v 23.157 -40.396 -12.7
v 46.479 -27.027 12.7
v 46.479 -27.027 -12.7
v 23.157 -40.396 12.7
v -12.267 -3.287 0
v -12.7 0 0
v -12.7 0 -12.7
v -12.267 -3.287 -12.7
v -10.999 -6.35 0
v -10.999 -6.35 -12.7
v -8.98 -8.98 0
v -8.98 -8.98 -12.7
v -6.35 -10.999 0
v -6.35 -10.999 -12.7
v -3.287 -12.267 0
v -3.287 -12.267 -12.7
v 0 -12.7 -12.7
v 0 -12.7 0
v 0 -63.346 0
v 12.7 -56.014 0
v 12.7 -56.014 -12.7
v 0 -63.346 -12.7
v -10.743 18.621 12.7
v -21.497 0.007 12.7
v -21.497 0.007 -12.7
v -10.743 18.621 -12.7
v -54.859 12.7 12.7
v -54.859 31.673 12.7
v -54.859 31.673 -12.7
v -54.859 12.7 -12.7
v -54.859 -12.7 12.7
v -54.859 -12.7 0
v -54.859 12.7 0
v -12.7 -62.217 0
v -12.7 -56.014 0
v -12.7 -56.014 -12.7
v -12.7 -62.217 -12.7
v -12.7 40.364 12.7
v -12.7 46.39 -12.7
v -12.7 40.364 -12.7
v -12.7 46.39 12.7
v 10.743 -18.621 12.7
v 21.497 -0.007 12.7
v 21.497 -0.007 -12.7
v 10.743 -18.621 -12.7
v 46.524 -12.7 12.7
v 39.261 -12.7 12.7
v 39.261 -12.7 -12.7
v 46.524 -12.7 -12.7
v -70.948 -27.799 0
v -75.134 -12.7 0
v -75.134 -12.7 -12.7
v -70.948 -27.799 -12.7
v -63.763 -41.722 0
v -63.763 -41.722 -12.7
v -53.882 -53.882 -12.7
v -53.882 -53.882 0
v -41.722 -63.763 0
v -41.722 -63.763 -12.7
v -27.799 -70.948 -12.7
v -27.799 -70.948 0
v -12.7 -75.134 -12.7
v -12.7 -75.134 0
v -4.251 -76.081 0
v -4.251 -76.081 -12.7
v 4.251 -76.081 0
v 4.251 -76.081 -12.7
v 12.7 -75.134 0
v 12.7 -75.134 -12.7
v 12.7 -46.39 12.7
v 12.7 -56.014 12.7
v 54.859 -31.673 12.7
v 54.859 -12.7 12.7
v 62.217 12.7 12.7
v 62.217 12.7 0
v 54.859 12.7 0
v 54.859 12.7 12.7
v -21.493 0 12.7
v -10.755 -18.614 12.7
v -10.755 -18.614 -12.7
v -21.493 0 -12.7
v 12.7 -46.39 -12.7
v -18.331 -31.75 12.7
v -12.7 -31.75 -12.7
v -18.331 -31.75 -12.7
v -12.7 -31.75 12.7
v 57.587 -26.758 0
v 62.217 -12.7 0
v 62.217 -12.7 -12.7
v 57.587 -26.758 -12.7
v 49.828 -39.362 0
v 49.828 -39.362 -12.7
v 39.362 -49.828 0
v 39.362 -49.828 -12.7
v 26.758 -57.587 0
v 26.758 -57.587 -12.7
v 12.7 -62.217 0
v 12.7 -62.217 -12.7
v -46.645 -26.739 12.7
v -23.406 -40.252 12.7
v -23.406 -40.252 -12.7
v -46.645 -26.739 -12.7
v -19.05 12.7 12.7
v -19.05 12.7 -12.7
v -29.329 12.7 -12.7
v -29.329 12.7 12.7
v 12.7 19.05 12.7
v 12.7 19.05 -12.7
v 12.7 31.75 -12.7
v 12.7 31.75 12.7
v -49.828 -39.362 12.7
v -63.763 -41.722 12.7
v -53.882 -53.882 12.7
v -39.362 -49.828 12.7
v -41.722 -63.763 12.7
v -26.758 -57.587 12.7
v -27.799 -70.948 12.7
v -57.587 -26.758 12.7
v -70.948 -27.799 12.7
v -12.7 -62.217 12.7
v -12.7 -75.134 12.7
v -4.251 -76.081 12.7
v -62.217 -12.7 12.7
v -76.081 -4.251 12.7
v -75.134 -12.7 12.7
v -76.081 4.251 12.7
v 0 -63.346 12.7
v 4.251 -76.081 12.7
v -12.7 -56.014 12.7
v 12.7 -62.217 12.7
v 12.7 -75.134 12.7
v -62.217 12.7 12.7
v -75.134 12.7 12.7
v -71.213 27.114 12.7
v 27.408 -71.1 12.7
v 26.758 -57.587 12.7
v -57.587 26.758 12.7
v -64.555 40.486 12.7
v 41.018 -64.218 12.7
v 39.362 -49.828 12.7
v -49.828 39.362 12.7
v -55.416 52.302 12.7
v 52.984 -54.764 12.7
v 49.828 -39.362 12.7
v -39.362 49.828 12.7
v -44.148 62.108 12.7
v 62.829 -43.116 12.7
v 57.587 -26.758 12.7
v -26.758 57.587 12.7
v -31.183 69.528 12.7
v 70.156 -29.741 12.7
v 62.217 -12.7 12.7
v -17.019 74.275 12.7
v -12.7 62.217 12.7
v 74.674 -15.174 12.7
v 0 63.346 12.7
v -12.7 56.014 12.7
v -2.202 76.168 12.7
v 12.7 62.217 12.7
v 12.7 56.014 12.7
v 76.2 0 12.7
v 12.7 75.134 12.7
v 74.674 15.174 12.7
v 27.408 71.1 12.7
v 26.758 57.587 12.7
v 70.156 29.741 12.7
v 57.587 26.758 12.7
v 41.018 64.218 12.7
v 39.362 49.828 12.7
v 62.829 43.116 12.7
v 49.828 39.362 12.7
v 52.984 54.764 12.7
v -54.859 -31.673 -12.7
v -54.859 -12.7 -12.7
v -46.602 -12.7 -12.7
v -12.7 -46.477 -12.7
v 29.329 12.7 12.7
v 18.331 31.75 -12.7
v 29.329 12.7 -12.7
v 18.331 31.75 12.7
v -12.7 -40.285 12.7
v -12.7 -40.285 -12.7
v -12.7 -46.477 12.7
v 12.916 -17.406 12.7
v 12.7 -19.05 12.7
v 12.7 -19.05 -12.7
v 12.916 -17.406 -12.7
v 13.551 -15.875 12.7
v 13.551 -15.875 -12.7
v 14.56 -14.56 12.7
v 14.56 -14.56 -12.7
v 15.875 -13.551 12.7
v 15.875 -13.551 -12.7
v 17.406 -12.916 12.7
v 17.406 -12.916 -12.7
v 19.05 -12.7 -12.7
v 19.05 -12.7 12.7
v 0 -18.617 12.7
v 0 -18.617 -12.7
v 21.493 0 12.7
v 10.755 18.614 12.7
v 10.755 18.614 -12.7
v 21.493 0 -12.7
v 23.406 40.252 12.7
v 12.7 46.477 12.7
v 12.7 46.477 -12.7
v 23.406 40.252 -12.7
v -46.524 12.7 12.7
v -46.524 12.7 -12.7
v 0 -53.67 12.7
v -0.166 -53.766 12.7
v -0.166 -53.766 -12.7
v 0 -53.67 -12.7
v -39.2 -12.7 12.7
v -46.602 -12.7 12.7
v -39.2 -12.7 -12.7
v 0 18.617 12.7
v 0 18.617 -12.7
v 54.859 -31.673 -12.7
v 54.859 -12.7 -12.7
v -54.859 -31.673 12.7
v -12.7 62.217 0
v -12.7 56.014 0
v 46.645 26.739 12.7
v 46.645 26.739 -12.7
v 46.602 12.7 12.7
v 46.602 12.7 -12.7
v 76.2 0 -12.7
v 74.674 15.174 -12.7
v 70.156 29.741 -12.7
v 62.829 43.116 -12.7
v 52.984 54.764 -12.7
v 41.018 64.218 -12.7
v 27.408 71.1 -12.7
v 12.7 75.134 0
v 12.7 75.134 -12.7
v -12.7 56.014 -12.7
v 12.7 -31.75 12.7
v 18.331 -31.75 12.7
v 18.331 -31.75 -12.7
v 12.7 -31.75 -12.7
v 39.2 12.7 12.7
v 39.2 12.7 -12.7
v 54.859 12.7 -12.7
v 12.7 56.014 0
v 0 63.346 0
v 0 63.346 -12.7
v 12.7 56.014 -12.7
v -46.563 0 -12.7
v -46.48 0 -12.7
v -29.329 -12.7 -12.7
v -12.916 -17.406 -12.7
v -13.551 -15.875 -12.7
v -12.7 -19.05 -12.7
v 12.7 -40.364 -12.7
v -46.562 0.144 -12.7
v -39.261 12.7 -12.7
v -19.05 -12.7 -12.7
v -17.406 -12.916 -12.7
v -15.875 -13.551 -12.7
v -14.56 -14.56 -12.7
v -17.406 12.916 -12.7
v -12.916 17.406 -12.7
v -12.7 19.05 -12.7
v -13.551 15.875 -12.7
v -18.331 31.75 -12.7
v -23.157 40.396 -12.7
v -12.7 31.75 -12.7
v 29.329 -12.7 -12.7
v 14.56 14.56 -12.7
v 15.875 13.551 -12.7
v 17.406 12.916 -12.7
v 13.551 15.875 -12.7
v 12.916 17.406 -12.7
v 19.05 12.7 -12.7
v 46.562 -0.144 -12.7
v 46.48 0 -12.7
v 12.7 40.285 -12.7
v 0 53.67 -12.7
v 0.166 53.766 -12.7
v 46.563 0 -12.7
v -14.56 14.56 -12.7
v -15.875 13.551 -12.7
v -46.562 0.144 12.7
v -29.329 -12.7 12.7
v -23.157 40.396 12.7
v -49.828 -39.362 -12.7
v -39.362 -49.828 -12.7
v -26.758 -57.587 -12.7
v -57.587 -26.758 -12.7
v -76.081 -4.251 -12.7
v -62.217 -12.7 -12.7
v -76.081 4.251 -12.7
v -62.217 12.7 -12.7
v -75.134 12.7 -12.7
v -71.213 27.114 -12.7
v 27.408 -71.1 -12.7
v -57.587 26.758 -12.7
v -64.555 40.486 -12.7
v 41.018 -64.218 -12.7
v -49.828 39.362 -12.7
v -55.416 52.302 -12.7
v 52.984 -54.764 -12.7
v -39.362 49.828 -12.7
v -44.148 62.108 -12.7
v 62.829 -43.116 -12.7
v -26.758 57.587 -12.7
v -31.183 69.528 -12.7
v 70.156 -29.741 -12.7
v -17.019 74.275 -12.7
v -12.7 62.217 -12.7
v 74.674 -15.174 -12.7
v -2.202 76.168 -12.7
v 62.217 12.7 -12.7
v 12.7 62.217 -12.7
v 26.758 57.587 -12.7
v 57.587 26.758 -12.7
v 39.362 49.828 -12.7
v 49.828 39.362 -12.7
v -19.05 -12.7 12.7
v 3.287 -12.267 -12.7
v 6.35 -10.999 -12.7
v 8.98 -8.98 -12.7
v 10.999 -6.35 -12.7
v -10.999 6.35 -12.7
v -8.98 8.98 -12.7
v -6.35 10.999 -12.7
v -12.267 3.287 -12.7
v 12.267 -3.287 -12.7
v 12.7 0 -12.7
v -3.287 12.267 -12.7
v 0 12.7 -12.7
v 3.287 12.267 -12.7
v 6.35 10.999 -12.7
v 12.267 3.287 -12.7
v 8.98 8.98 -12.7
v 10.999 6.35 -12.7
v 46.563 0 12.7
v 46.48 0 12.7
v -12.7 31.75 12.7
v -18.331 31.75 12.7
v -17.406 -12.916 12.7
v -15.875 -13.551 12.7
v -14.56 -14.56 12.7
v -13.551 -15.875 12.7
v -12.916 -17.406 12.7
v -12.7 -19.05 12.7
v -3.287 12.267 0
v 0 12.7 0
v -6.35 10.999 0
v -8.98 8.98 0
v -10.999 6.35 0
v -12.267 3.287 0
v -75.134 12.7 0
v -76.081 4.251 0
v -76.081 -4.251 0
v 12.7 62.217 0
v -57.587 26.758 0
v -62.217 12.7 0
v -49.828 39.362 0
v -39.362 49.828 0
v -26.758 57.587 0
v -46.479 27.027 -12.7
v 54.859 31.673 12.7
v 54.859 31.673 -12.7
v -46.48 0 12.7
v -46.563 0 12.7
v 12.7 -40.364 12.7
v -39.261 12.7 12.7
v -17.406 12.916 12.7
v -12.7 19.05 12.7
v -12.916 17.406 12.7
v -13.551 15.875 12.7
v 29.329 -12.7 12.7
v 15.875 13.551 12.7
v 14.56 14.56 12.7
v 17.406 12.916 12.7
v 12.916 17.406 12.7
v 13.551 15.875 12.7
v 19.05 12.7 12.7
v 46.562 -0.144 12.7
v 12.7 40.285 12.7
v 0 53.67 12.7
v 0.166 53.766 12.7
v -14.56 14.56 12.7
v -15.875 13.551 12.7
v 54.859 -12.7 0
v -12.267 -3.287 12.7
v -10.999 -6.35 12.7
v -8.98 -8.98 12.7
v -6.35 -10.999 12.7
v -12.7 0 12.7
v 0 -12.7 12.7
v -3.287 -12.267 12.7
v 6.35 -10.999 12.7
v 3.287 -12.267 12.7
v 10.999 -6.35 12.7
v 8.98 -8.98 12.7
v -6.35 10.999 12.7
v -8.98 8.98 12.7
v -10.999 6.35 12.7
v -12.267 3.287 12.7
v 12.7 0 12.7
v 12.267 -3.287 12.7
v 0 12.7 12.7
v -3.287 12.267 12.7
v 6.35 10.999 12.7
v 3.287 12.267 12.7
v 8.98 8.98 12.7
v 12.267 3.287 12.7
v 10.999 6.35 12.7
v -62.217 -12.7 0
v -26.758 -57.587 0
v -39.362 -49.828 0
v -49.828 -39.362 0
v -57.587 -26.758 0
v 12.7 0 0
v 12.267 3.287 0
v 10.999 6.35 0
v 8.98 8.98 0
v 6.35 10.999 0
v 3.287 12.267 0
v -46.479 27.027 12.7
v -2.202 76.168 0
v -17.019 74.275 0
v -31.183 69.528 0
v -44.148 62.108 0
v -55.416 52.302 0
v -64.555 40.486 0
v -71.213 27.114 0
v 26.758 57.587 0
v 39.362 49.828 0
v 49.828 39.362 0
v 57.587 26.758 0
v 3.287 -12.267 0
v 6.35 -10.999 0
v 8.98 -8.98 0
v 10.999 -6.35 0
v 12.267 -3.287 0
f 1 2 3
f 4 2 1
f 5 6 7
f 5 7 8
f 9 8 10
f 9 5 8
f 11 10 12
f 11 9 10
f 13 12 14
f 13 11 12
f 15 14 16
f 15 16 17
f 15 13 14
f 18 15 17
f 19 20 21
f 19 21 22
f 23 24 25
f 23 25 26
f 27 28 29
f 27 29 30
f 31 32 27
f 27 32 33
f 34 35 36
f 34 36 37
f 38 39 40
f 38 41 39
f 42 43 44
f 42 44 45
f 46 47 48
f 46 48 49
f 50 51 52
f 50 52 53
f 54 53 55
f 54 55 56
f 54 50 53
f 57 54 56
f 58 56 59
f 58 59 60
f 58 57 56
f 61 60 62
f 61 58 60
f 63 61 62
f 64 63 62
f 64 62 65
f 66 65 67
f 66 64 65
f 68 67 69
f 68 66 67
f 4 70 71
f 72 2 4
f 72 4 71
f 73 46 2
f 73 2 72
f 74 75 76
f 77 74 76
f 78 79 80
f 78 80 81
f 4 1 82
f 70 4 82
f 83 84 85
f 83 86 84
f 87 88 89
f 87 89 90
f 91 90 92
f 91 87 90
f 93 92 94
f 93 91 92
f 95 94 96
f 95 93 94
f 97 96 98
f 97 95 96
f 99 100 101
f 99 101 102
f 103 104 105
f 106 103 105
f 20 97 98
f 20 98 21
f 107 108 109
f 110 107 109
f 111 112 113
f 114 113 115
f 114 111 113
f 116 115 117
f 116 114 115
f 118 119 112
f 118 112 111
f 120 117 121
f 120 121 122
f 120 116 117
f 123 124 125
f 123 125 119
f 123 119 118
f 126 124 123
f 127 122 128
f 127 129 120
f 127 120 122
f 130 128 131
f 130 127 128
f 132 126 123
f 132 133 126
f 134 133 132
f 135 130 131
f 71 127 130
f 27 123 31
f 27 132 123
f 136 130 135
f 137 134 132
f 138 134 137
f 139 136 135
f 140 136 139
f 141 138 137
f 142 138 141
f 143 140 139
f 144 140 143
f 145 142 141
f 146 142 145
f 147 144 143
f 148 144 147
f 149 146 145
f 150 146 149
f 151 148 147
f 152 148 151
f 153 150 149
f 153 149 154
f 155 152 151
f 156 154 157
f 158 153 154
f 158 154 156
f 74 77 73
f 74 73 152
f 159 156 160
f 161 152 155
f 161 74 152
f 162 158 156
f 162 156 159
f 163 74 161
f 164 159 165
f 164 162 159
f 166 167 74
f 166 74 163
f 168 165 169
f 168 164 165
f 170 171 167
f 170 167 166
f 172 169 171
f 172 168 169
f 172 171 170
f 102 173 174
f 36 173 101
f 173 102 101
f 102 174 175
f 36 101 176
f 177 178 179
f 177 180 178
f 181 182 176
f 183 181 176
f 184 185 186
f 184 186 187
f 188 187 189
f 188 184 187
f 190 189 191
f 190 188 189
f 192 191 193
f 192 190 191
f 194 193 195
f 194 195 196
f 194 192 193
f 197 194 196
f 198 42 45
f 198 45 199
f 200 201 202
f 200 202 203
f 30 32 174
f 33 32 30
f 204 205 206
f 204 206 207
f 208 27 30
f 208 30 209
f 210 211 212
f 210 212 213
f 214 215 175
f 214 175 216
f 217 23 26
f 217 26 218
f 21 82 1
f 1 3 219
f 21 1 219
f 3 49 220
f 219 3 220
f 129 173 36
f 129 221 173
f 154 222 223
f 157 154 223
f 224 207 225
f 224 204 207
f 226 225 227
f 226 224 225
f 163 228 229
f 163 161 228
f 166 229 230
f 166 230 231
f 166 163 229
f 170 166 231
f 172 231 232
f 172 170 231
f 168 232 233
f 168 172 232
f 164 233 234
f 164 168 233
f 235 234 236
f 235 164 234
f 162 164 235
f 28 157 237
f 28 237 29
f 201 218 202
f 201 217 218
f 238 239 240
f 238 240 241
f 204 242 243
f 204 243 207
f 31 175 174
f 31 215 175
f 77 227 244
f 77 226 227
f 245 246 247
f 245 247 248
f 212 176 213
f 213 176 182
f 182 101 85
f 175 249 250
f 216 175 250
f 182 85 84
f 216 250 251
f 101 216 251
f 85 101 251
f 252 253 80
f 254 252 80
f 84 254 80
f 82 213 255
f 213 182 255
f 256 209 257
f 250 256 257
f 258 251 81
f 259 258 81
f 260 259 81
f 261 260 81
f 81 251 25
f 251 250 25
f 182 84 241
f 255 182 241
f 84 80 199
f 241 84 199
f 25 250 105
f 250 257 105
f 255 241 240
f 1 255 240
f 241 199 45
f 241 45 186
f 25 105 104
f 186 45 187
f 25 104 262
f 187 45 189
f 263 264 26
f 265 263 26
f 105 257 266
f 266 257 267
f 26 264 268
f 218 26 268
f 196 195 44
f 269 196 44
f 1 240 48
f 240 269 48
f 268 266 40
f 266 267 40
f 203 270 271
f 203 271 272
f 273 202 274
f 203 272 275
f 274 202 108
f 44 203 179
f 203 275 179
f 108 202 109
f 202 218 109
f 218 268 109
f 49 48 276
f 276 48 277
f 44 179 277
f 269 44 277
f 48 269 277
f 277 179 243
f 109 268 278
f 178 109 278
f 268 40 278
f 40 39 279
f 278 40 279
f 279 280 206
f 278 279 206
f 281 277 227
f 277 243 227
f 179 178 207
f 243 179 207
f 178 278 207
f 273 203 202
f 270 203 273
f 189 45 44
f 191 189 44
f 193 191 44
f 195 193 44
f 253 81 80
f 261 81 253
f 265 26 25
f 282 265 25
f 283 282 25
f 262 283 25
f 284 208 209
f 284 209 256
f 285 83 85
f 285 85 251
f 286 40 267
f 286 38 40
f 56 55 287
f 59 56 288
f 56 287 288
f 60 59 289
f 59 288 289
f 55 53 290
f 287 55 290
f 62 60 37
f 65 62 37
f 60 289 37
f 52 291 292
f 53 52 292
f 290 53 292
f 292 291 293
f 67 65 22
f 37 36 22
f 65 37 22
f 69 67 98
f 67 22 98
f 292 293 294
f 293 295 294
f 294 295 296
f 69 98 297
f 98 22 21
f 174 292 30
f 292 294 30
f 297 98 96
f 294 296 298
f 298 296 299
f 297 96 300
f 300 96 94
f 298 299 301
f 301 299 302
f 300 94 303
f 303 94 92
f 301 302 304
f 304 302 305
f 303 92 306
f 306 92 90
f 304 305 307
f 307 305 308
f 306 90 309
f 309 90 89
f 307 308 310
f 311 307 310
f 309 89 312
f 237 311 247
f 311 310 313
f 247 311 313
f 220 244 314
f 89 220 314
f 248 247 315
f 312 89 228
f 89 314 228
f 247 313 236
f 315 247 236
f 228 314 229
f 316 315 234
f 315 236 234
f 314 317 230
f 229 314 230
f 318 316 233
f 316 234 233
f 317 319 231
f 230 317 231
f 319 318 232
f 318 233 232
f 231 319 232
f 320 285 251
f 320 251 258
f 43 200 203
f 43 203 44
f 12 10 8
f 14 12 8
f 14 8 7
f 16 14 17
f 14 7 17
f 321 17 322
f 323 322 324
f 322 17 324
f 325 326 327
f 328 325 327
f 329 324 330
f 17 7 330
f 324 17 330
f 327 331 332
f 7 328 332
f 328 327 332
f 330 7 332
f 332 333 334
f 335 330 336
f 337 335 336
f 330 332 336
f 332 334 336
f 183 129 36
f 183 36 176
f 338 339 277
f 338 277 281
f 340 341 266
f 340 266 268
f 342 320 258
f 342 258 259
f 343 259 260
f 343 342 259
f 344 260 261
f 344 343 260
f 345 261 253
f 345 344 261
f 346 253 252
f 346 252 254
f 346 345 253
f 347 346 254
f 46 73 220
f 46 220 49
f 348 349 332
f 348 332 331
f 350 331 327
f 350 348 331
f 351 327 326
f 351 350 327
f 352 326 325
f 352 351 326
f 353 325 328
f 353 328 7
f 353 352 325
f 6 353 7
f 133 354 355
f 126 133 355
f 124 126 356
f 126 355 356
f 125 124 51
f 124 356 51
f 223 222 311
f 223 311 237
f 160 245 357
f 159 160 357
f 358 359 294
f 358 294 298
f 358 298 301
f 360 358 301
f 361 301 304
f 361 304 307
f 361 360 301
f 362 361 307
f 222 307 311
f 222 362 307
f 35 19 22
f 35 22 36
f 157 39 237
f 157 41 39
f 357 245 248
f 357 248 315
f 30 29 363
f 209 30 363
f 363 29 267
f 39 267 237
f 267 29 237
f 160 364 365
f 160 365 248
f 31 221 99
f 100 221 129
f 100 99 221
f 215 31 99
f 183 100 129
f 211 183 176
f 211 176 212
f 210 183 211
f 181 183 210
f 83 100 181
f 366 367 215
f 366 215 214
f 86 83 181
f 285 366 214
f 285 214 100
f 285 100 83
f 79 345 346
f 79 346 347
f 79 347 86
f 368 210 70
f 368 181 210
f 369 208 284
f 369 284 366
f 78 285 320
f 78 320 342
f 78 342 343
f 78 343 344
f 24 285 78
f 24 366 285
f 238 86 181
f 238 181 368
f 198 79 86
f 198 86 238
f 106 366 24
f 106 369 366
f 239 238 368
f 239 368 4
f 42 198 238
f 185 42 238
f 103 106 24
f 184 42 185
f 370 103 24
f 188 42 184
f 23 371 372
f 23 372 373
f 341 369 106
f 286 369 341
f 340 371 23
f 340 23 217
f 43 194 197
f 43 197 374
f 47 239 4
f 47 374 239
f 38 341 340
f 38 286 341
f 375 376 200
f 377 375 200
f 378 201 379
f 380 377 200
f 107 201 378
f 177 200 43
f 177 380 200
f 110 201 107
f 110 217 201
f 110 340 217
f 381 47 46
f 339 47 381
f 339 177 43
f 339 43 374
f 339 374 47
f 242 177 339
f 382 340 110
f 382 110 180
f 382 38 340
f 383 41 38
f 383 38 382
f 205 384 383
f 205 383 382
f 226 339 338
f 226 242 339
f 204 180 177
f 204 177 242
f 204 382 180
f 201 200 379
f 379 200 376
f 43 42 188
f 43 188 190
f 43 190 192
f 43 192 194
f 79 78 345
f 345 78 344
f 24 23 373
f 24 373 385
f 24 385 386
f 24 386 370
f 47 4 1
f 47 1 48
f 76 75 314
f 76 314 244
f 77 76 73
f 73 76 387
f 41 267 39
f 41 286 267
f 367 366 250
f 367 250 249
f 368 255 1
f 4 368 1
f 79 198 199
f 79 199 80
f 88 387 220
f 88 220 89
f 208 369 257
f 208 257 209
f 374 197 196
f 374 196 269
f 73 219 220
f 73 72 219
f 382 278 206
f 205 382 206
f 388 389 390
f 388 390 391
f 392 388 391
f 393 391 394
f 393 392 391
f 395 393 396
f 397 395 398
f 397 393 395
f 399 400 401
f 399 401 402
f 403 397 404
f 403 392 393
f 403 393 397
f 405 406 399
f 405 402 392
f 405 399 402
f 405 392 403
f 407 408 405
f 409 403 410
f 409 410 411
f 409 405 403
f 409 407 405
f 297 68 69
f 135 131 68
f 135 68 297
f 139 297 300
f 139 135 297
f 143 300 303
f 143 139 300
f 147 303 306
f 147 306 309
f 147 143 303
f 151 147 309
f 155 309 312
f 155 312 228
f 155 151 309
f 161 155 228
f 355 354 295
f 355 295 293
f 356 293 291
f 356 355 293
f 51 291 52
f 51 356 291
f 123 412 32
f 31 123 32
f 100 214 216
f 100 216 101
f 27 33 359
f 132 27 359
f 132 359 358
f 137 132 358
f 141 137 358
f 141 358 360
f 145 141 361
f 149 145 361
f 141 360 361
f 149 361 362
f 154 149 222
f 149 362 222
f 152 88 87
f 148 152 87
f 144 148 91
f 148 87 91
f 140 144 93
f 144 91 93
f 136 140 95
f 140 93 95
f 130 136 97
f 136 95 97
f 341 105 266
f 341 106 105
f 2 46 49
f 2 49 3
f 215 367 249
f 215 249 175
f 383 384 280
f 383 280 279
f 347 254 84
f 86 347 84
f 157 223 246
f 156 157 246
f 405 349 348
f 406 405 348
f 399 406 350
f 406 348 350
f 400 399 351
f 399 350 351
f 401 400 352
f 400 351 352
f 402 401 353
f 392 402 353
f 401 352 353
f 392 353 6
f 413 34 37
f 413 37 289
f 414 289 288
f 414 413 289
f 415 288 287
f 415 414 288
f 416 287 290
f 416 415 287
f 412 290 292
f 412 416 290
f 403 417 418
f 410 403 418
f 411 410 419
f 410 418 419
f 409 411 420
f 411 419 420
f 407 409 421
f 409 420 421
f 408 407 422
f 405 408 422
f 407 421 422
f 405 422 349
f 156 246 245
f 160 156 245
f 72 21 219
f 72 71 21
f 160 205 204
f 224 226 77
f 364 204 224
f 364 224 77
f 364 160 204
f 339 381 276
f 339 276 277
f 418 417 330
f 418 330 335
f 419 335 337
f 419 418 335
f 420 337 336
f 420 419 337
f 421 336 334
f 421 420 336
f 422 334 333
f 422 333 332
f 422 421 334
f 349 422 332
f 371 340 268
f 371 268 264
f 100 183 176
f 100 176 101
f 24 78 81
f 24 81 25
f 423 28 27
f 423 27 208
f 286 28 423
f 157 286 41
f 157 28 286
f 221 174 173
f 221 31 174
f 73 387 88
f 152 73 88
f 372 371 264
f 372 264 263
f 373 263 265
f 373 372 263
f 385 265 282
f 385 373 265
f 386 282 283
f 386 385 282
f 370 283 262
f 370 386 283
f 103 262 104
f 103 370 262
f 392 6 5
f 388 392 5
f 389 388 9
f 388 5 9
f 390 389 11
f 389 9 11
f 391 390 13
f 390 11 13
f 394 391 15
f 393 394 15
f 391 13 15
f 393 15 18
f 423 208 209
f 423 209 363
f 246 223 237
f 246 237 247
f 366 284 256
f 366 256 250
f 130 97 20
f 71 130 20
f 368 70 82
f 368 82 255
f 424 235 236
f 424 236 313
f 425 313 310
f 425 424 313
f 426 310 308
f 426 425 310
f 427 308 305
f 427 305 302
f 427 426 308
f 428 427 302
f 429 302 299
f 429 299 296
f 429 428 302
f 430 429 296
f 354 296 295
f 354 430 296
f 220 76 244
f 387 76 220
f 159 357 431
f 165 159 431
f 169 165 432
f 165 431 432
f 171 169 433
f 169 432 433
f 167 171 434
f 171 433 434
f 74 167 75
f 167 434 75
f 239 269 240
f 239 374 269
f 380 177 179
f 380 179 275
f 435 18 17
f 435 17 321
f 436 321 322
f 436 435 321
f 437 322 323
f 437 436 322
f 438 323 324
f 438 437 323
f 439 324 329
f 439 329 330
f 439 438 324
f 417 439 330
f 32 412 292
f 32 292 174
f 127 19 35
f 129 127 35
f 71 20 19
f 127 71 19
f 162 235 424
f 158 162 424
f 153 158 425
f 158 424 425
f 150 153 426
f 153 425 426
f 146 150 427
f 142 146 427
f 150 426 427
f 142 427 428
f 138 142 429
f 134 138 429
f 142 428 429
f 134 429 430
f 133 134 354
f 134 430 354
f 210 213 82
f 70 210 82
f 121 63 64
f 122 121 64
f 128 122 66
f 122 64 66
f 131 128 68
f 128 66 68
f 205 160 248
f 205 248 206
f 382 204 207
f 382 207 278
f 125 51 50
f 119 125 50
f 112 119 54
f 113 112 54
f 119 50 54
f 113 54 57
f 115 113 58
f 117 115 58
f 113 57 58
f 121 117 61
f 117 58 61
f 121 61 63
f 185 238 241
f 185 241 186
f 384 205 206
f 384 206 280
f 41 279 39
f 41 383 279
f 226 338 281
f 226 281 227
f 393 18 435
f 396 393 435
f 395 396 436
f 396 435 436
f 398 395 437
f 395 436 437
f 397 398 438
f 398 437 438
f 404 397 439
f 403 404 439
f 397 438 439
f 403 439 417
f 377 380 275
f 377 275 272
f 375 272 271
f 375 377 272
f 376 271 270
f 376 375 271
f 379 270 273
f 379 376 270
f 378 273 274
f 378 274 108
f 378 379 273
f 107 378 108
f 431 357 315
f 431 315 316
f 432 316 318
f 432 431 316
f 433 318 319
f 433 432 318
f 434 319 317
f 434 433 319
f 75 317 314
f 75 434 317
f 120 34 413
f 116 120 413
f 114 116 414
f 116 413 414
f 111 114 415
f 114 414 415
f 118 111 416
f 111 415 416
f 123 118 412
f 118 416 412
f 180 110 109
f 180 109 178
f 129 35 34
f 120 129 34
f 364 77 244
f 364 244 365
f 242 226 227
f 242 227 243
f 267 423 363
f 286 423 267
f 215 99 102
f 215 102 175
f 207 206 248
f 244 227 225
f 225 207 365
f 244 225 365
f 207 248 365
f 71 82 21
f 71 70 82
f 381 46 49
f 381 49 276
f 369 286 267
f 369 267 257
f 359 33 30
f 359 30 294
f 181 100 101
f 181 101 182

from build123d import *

# Parameters (mm, degrees)
F1_DEPTH = 12.7


with BuildPart() as f1:
    # F0 (on Top) → F1 (new body, symmetric)
    with BuildSketch(Plane.XY):
        with BuildLine():
            ThreePointArc((75.1342132454, -12.7), (75.9330858365, -6.3723210333), (76.2, 0))
            ThreePointArc((76.2, 0), (75.9330858365, 6.3723210333), (75.1342132454, 12.7))
            ThreePointArc((75.1342132454, 12.7), (53.8815367264, 53.8815367264), (12.7, 75.1342132454))
            ThreePointArc((12.7, 75.1342132454), (7.78e-08, 76.2), (-12.6999998465, 75.1342132713))
            ThreePointArc((-12.6999998465, 75.1342132713), (-53.8815366714, 53.8815367814), (-75.1342132454, 12.7))
            ThreePointArc((-75.1342132454, 12.7), (-76.2, 0), (-75.1342132454, -12.7))
            ThreePointArc((-75.1342132454, -12.7), (-53.8815367264, -53.8815367264), (-12.7, -75.1342132454))
            ThreePointArc((-12.7, -75.1342132454), (0, -76.2), (12.7, -75.1342132454))
            ThreePointArc((12.7, -75.1342132454), (53.8815367264, -53.8815367264), (75.1342132454, -12.7))
        make_face()
        with BuildLine():
            ThreePointArc((12.7, 62.2170394667), (44.9012806053, 44.9012806053), (62.2170394667, 12.7))
            Line((62.2170394667, 12.7), (54.8591923875, 12.7))
            Line((54.8591923875, 12.7), (54.8591923875, 0))
            Line((54.8591923875, 0), (54.8591923875, -12.7))
            Line((54.8591923875, -12.7), (62.2170394667, -12.7))
            ThreePointArc((62.2170394667, -12.7), (44.9012806053, -44.9012806053), (12.7, -62.2170394667))
            Line((12.7, -62.2170394667), (12.7, -56.0135905662))
            Line((12.7, -56.0135905662), (0, -63.345938985))
            Line((0, -63.345938985), (-12.7, -56.0135905662))
            Line((-12.7, -56.0135905662), (-12.7, -62.2170394667))
            ThreePointArc((-12.7, -62.2170394667), (-44.9012806053, -44.9012806053), (-62.2170394667, -12.7))
            Line((-62.2170394667, -12.7), (-54.8591923875, -12.7))
            Line((-54.8591923875, -12.7), (-54.8591923875, 0))
            Line((-54.8591923875, 0), (-54.8591923875, 12.7))
            Line((-54.8591923875, 12.7), (-62.2170394667, 12.7))
            ThreePointArc((-62.2170394667, 12.7), (-44.90128055, 44.9012806607), (-12.6999998465, 62.217039498))
            Line((-12.6999998465, 62.217039498), (-12.6999998465, 56.0135906549))
            Line((-12.6999998465, 56.0135906549), (0, 63.345938985))
            Line((0, 63.345938985), (12.7, 56.0135905662))
            Line((12.7, 56.0135905662), (12.7, 62.2170394667))
        make_face(mode=Mode.SUBTRACT)
    extrude(amount=F1_DEPTH, both=True)


with BuildPart() as f1b:
    # F0 (on Top) → F1, piece 2 (new body, symmetric)
    with BuildSketch(Plane.XY):
        Polygon((-12.6999998465, 31.75), (-12.6999998465, 40.3638147368), (-23.1565790973, 40.3961253963), (-39.2612559174, 12.7), (-29.3293936748, 12.7), (-18.3308710468, 31.75), align=None)
        Polygon((-29.3293936748, 12.7), (-39.2612559174, 12.7), (-46.5623603563, 0.1438769352), (-46.4798846833, 0), (-36.6617420935, 0), align=None)
        Polygon((-29.3293936748, -12.7), (-36.6617420935, 0), (-46.4798846833, 0), (-39.1997668094, -12.7), align=None)
        Polygon((-23.405781259, -40.2522484612), (-12.7, -40.2853291509), (-12.7, -31.75), (-18.3308710468, -31.75), (-29.3293936748, -12.7), (-39.1997668094, -12.7), align=None)
        Polygon((-12.7, -40.2853291509), (0, -40.3245719441), (0, -31.75), (-12.7, -31.75), align=None)
        Polygon((0, -40.3245719441), (12.7, -40.3638147372), (12.7, -31.75), (0, -31.75), align=None)
        Polygon((23.1565790973, -40.3961253963), (39.2612559174, -12.7), (29.3293936748, -12.7), (18.3308710468, -31.75), (12.7, -31.75), (12.7, -40.3638147372), align=None)
        Polygon((46.5623603563, -0.1438769352), (46.4798846833, 0), (36.6617420935, 0), (29.3293936748, -12.7), (39.2612559174, -12.7), align=None)
        Polygon((46.4798846833, 0), (39.1997668094, 12.7), (29.3293936748, 12.7), (36.6617420935, 0), align=None)
        Polygon((29.3293936748, 12.7), (39.1997668094, 12.7), (23.405781259, 40.2522484612), (12.7, 40.2853291509), (12.7, 31.75), (18.3308710468, 31.75), align=None)
        Polygon((12.7, 31.75), (12.7, 40.2853291509), (0, 40.3245719441), (0, 31.75), align=None)
        Polygon((0, 31.75), (0, 40.3245719441), (-12.6999998465, 40.3638147368), (-12.6999998465, 31.75), align=None)
        with BuildLine():
            Line((36.6617420935, 0), (29.3293936748, 12.7))
            Line((29.3293936748, 12.7), (19.05, 12.7))
            ThreePointArc((19.05, 12.7), (14.5598719395, 14.5598719395), (12.7, 19.05))
            Line((12.7, 19.05), (12.7, 31.75))
            Line((12.7, 31.75), (0, 31.75))
            Line((0, 31.75), (0, 18.6173117573))
            Line((0, 18.6173117573), (10.7546742122, 18.613865743))
            Line((10.7546742122, 18.613865743), (21.493443737, 0))
            Line((21.493443737, 0), (36.6617420935, 0))
        make_face()
        with BuildLine():
            Line((29.3293936748, -12.7), (36.6617420935, 0))
            Line((36.6617420935, 0), (21.493443737, 0))
            Line((21.493443737, 0), (21.4974177022, -0.0068882057))
            Line((21.4974177022, -0.0068882057), (10.74274349, -18.6207539487))
            Line((10.74274349, -18.6207539487), (0, -18.6173117573))
            Line((0, -18.6173117573), (0, -31.75))
            Line((0, -31.75), (12.7, -31.75))
            Line((12.7, -31.75), (12.7, -19.05))
            ThreePointArc((12.7, -19.05), (14.5598719395, -14.5598719395), (19.05, -12.7))
            Line((19.05, -12.7), (29.3293936748, -12.7))
        make_face()
        with BuildLine():
            Line((-21.493443737, 0), (-36.6617420935, 0))
            Line((-36.6617420935, 0), (-29.3293936748, -12.7))
            Line((-29.3293936748, -12.7), (-19.05, -12.7))
            ThreePointArc((-19.05, -12.7), (-14.5598719395, -14.5598719395), (-12.7, -19.05))
            Line((-12.7, -19.05), (-12.7, -31.75))
            Line((-12.7, -31.75), (0, -31.75))
            Line((0, -31.75), (0, -18.6173117573))
            Line((0, -18.6173117573), (-10.7546742122, -18.613865743))
            Line((-10.7546742122, -18.613865743), (-21.493443737, 0))
        make_face()
        with BuildLine():
            Line((0, 18.6173117573), (0, 31.75))
            Line((0, 31.75), (-12.6999998465, 31.75))
            Line((-12.6999998465, 31.75), (-12.6999998465, 19.05))
            ThreePointArc((-12.6999998465, 19.05), (-14.559871786, 14.5598719395), (-19.0499998465, 12.7))
            Line((-19.0499998465, 12.7), (-29.3293936748, 12.7))
            Line((-29.3293936748, 12.7), (-36.6617420935, 0))
            Line((-36.6617420935, 0), (-21.493443737, 0))
            Line((-21.493443737, 0), (-21.4974177022, 0.0068882057))
            Line((-21.4974177022, 0.0068882057), (-10.74274349, 18.6207539487))
            Line((-10.74274349, 18.6207539487), (0, 18.6173117573))
        make_face()
        Polygon((0, 40.3245719441), (0, 53.6703478676), (-12.6999998465, 46.3902300817), (-12.6999998465, 40.3638147368), align=None)
        Polygon((12.7, 40.2853291509), (12.7, 46.477420568), (0.1661347745, 53.7655825717), (0, 53.6703478676), (0, 40.3245719441), align=None)
        Polygon((46.5628049337, 0), (46.6020477269, 12.7), (39.1997668094, 12.7), (46.4798846833, 0), align=None)
        Polygon((46.5235621406, -12.7), (46.5623603563, -0.1438769352), (39.2612559174, -12.7), align=None)
        Polygon((0, -53.6703478676), (12.7, -46.3902299937), (12.7, -40.3638147372), (0, -40.3245719441), align=None)
        Polygon((-0.1661347745, -53.7655825717), (0, -53.6703478676), (0, -40.3245719441), (-12.7, -40.2853291509), (-12.7, -46.477420568), align=None)
        Polygon((-46.4798846833, 0), (-46.5628049337, 0), (-46.6020477269, -12.7), (-39.1997668094, -12.7), align=None)
        Polygon((-46.5623603563, 0.1438769352), (-39.2612559174, 12.7), (-46.5235621406, 12.7), align=None)
    extrude(amount=F1_DEPTH, both=True)


with BuildPart() as f1c:
    # F0 (on Top) → F1, piece 3 (new body, symmetric)
    with BuildSketch(Plane.XY):
        Polygon((46.6020477269, 12.7), (54.8591923875, 12.7), (54.8591923875, 31.6729694925), (12.7, 56.0135905662), (12.7, 46.477420568), (23.405781259, 40.2522484612), (46.6454277436, 26.7389143507), align=None)
    extrude(amount=F1_DEPTH, both=True)


with BuildPart() as f1d:
    # F0 (on Top) → F1, piece 4 (new body, symmetric)
    with BuildSketch(Plane.XY):
        Polygon((54.8591923875, -31.6729694925), (54.8591923875, -12.7), (46.5235621406, -12.7), (46.4792929691, -27.026668221), (23.1565790973, -40.3961253963), (12.7, -46.3902299937), (12.7, -56.0135905662), align=None)
    extrude(amount=F1_DEPTH, both=True)


with BuildPart() as f1e:
    # F0 (on Top) → F1, piece 5 (new body, symmetric)
    with BuildSketch(Plane.XY):
        Polygon((-54.8591923875, -31.6729694925), (-12.7, -56.0135905662), (-12.7, -46.477420568), (-23.405781259, -40.2522484612), (-46.6454277436, -26.7389143507), (-46.6020477269, -12.7), (-54.8591923875, -12.7), align=None)
    extrude(amount=F1_DEPTH, both=True)


with BuildPart() as f1f:
    # F0 (on Top) → F1, piece 6 (new body, symmetric)
    with BuildSketch(Plane.XY):
        Polygon((-12.6999998465, 46.3902300817), (-12.6999998465, 56.0135906549), (-54.8591923875, 31.6729694925), (-54.8591923875, 12.7), (-46.5235621406, 12.7), (-46.4792929691, 27.026668221), (-23.1565790973, 40.3961253963), align=None)
    extrude(amount=F1_DEPTH, both=True)


with BuildPart() as f1g:
    # F0 (on Top) → F1, piece 7 (new body, symmetric)
    with BuildSketch(Plane.XY):
        with BuildLine():
            Line((0, 0), (0, 12.7))
            ThreePointArc((0, 12.7), (-8.9802561211, 8.9802561211), (-12.7, 0))
            Line((-12.7, 0), (0, 0))
        make_face()
        with BuildLine():
            Line((0, 0), (12.7, 0))
            ThreePointArc((12.7, 0), (8.9802561211, 8.9802561211), (0, 12.7))
            Line((0, 12.7), (0, 0))
        make_face()
        with BuildLine():
            ThreePointArc((0, -12.7), (8.9802561211, -8.9802561211), (12.7, 0))
            Line((12.7, 0), (0, 0))
            Line((0, 0), (0, -12.7))
        make_face()
        with BuildLine():
            ThreePointArc((-12.7, 0), (-8.9802561211, -8.9802561211), (0, -12.7))
            Line((0, -12.7), (0, 0))
            Line((0, 0), (-12.7, 0))
        make_face()
    extrude(amount=F1_DEPTH, both=True)


solid = Compound([f1.part, f1b.part, f1c.part, f1d.part, f1e.part, f1f.part, f1g.part])
